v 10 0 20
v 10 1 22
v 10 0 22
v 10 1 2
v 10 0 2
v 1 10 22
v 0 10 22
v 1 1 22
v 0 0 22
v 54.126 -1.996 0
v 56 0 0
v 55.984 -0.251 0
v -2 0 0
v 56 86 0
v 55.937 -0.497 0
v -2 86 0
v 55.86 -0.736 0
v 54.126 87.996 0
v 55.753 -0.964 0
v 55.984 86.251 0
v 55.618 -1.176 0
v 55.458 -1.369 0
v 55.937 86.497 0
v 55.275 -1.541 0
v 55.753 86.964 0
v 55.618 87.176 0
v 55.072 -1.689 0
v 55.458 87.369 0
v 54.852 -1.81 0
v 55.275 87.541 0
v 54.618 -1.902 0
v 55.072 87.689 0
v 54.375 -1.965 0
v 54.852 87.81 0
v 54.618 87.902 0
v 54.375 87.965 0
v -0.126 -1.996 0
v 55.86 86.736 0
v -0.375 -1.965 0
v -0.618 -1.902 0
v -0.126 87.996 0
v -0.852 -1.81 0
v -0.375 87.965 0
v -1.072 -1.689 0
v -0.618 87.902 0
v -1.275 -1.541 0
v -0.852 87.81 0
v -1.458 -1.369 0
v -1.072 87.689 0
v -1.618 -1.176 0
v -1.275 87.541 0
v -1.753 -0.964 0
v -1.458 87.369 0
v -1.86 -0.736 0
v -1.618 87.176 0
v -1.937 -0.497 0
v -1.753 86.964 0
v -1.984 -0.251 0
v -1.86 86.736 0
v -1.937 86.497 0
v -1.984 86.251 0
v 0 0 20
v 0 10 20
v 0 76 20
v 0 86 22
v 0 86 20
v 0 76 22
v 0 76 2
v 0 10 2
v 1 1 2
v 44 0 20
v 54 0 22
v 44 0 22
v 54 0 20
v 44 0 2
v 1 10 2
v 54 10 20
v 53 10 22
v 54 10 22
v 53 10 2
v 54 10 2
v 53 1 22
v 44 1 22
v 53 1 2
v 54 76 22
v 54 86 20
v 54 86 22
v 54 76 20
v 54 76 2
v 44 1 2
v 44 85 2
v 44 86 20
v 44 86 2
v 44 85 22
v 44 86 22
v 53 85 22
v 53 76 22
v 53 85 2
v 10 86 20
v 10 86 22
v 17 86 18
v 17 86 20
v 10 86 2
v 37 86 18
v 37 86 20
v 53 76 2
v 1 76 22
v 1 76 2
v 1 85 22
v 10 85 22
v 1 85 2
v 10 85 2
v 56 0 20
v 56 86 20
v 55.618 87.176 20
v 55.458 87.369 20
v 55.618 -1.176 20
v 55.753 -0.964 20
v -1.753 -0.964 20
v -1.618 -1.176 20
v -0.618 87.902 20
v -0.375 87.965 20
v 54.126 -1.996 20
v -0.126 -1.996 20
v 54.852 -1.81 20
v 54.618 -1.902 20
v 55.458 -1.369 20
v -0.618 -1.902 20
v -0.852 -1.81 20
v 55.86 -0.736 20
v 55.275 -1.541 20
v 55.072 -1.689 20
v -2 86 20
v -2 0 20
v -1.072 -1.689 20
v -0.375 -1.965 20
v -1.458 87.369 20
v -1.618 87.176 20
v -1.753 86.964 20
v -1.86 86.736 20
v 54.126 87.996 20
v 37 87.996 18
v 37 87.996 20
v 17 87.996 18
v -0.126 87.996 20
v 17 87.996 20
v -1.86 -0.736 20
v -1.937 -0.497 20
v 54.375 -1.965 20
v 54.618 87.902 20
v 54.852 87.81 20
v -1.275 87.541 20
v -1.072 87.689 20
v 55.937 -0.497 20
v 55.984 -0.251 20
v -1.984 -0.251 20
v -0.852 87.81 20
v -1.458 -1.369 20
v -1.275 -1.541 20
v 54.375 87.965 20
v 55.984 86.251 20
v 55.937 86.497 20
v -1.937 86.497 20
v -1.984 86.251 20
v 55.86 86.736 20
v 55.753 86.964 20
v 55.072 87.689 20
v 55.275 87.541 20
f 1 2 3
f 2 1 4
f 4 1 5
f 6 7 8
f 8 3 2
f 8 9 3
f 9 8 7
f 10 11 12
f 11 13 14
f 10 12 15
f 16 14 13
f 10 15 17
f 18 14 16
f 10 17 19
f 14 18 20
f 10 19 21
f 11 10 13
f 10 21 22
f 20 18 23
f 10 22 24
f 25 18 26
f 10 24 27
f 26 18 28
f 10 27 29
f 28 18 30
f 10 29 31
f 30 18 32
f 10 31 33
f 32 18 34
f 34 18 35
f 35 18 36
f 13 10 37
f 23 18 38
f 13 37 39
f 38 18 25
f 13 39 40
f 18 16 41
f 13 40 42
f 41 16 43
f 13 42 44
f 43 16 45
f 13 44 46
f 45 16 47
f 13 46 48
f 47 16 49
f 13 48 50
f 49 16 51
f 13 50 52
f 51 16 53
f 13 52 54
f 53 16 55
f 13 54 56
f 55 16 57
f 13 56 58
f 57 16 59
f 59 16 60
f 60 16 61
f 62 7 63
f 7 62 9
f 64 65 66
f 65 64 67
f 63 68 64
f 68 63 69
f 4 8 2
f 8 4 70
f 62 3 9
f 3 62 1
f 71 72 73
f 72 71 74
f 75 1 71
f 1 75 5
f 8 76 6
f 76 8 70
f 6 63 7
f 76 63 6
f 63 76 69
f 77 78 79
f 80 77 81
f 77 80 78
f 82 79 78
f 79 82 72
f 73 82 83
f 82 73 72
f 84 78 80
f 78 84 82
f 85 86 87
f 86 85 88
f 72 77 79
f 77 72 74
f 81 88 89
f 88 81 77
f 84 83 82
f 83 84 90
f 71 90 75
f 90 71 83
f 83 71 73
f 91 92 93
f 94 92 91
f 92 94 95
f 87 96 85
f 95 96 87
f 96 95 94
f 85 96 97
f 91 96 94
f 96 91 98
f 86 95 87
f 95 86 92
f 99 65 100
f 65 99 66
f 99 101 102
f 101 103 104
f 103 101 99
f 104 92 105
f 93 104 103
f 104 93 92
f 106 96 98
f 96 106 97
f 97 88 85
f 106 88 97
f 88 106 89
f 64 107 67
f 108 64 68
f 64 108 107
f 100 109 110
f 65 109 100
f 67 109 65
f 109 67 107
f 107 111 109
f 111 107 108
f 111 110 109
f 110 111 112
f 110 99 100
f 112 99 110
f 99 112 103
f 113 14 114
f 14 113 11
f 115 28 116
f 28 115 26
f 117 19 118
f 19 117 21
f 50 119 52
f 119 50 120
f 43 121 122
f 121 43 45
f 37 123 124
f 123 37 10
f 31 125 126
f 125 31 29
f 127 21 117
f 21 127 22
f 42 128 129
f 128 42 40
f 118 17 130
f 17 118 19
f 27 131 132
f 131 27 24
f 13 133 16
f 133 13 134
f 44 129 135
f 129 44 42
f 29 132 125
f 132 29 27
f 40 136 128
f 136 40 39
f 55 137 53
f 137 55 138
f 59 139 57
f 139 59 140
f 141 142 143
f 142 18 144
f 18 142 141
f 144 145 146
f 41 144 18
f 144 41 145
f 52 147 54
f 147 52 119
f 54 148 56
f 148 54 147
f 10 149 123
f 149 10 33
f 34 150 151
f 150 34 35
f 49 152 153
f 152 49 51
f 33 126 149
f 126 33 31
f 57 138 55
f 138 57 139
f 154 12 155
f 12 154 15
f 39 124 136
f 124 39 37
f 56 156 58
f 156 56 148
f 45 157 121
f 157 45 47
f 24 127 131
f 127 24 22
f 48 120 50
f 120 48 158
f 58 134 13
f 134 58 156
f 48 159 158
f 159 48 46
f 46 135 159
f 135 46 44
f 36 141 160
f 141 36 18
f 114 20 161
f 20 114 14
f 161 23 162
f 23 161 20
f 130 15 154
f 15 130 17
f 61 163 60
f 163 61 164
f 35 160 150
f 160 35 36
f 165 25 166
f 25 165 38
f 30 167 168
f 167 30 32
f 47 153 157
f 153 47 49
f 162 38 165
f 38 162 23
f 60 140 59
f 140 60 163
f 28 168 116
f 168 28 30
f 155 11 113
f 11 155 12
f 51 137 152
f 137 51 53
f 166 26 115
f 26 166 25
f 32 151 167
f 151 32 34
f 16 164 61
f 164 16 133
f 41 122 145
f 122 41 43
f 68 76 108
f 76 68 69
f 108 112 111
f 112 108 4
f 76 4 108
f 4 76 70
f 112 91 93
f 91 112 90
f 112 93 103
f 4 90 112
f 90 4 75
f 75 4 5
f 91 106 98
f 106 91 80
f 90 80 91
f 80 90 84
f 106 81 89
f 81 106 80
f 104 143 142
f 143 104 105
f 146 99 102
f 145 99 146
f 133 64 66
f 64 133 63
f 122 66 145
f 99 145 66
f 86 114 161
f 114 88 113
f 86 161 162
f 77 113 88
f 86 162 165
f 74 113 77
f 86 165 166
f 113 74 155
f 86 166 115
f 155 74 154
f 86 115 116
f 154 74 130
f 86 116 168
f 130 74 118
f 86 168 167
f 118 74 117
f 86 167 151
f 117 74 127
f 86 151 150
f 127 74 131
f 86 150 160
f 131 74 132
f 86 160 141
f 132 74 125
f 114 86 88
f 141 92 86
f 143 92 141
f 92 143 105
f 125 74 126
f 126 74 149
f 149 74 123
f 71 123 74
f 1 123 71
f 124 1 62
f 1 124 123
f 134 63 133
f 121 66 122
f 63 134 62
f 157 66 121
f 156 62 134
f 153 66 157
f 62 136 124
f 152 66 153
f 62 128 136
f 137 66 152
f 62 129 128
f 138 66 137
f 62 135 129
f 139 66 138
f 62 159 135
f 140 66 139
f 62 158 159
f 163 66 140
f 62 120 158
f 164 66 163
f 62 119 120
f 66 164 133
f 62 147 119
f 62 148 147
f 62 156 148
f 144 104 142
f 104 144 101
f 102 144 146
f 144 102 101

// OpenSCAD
 $fn=50;

width = 54;
length = 86;
height = 36;
thickness = 2;

BOTTOM= true;

bottom = 20;

if (BOTTOM) corners();
difference(){ 
    outer();
    inner();
    airflow();
    //jackAndPower();
    cables();
    
    if (BOTTOM) removeTop();
    if (!BOTTOM) removeBottom();
}  

 //board();


module board () {
    translate([thickness, thickness, 1]) {
        cube([50, 84, 9]);
        rjack = 4;
        translate([9+rjack, 0, 10]) rotate([90, 0, 0]) cylinder(r=rjack, h=10);
        rpower = 4;
        translate([34+rpower, 0, 10]) rotate([90, 0, 0]) cylinder(r=+rpower, h=10);
    }
}

module jackAndPower() {
    translate([thickness, thickness, 1]) {
        rjack = 4;
        translate([9+rjack, 0, 9]) rotate([90, 0, 0]) cylinder(r=rjack, h=10);
        rpower = 4;
        translate([34+rpower, 0, 10]) rotate([90, 0, 0]) cylinder(r=+rpower, h=10);
    }
}

module removeTop() {
    translate([-10,-10, bottom]) cube([width*2,length*2, height*2]);
}

module removeBottom() {
translate([-10,-10, -5]) cube([width*2,length*2, bottom+5]);
}

module outer() {
    minkowski() {
     cube([width,length, height]);
      cylinder(r=thickness,h=1);
    }
}

module inner () {
translate([0,0, thickness]) cube([width,length, height  - thickness]);
}

module corners() {
    corner();
    translate([width, 0, 0]) rotate([0, 0, 90]) corner();
    translate([width, length, 0]) rotate([0, 0, 180]) corner();
    translate([0, length, 0]) rotate([0, 0, 270]) corner();
}

module corner () {
    w = 10;
    cube([w, 1, bottom+2]);
    cube([1, w, bottom+2]);
}

module cables() {
    w = 20;
    translate([width / 2 - w / 2, length-2,bottom-2]) cube([w, 10, 2]);
}


module airflow () {
translate([10, 10, height]) cube([width - 20, 2, 10]);
translate([10, 15, height]) cube([width - 20, 2, 10]);
translate([10, 20, height]) cube([width - 20, 2, 10]);
translate([10, 25, height]) cube([width - 20, 2, 10]);
translate([10, 30, height]) cube([width - 20, 2, 10]);
translate([10, 35, height]) cube([width - 20, 2, 10]);
}
